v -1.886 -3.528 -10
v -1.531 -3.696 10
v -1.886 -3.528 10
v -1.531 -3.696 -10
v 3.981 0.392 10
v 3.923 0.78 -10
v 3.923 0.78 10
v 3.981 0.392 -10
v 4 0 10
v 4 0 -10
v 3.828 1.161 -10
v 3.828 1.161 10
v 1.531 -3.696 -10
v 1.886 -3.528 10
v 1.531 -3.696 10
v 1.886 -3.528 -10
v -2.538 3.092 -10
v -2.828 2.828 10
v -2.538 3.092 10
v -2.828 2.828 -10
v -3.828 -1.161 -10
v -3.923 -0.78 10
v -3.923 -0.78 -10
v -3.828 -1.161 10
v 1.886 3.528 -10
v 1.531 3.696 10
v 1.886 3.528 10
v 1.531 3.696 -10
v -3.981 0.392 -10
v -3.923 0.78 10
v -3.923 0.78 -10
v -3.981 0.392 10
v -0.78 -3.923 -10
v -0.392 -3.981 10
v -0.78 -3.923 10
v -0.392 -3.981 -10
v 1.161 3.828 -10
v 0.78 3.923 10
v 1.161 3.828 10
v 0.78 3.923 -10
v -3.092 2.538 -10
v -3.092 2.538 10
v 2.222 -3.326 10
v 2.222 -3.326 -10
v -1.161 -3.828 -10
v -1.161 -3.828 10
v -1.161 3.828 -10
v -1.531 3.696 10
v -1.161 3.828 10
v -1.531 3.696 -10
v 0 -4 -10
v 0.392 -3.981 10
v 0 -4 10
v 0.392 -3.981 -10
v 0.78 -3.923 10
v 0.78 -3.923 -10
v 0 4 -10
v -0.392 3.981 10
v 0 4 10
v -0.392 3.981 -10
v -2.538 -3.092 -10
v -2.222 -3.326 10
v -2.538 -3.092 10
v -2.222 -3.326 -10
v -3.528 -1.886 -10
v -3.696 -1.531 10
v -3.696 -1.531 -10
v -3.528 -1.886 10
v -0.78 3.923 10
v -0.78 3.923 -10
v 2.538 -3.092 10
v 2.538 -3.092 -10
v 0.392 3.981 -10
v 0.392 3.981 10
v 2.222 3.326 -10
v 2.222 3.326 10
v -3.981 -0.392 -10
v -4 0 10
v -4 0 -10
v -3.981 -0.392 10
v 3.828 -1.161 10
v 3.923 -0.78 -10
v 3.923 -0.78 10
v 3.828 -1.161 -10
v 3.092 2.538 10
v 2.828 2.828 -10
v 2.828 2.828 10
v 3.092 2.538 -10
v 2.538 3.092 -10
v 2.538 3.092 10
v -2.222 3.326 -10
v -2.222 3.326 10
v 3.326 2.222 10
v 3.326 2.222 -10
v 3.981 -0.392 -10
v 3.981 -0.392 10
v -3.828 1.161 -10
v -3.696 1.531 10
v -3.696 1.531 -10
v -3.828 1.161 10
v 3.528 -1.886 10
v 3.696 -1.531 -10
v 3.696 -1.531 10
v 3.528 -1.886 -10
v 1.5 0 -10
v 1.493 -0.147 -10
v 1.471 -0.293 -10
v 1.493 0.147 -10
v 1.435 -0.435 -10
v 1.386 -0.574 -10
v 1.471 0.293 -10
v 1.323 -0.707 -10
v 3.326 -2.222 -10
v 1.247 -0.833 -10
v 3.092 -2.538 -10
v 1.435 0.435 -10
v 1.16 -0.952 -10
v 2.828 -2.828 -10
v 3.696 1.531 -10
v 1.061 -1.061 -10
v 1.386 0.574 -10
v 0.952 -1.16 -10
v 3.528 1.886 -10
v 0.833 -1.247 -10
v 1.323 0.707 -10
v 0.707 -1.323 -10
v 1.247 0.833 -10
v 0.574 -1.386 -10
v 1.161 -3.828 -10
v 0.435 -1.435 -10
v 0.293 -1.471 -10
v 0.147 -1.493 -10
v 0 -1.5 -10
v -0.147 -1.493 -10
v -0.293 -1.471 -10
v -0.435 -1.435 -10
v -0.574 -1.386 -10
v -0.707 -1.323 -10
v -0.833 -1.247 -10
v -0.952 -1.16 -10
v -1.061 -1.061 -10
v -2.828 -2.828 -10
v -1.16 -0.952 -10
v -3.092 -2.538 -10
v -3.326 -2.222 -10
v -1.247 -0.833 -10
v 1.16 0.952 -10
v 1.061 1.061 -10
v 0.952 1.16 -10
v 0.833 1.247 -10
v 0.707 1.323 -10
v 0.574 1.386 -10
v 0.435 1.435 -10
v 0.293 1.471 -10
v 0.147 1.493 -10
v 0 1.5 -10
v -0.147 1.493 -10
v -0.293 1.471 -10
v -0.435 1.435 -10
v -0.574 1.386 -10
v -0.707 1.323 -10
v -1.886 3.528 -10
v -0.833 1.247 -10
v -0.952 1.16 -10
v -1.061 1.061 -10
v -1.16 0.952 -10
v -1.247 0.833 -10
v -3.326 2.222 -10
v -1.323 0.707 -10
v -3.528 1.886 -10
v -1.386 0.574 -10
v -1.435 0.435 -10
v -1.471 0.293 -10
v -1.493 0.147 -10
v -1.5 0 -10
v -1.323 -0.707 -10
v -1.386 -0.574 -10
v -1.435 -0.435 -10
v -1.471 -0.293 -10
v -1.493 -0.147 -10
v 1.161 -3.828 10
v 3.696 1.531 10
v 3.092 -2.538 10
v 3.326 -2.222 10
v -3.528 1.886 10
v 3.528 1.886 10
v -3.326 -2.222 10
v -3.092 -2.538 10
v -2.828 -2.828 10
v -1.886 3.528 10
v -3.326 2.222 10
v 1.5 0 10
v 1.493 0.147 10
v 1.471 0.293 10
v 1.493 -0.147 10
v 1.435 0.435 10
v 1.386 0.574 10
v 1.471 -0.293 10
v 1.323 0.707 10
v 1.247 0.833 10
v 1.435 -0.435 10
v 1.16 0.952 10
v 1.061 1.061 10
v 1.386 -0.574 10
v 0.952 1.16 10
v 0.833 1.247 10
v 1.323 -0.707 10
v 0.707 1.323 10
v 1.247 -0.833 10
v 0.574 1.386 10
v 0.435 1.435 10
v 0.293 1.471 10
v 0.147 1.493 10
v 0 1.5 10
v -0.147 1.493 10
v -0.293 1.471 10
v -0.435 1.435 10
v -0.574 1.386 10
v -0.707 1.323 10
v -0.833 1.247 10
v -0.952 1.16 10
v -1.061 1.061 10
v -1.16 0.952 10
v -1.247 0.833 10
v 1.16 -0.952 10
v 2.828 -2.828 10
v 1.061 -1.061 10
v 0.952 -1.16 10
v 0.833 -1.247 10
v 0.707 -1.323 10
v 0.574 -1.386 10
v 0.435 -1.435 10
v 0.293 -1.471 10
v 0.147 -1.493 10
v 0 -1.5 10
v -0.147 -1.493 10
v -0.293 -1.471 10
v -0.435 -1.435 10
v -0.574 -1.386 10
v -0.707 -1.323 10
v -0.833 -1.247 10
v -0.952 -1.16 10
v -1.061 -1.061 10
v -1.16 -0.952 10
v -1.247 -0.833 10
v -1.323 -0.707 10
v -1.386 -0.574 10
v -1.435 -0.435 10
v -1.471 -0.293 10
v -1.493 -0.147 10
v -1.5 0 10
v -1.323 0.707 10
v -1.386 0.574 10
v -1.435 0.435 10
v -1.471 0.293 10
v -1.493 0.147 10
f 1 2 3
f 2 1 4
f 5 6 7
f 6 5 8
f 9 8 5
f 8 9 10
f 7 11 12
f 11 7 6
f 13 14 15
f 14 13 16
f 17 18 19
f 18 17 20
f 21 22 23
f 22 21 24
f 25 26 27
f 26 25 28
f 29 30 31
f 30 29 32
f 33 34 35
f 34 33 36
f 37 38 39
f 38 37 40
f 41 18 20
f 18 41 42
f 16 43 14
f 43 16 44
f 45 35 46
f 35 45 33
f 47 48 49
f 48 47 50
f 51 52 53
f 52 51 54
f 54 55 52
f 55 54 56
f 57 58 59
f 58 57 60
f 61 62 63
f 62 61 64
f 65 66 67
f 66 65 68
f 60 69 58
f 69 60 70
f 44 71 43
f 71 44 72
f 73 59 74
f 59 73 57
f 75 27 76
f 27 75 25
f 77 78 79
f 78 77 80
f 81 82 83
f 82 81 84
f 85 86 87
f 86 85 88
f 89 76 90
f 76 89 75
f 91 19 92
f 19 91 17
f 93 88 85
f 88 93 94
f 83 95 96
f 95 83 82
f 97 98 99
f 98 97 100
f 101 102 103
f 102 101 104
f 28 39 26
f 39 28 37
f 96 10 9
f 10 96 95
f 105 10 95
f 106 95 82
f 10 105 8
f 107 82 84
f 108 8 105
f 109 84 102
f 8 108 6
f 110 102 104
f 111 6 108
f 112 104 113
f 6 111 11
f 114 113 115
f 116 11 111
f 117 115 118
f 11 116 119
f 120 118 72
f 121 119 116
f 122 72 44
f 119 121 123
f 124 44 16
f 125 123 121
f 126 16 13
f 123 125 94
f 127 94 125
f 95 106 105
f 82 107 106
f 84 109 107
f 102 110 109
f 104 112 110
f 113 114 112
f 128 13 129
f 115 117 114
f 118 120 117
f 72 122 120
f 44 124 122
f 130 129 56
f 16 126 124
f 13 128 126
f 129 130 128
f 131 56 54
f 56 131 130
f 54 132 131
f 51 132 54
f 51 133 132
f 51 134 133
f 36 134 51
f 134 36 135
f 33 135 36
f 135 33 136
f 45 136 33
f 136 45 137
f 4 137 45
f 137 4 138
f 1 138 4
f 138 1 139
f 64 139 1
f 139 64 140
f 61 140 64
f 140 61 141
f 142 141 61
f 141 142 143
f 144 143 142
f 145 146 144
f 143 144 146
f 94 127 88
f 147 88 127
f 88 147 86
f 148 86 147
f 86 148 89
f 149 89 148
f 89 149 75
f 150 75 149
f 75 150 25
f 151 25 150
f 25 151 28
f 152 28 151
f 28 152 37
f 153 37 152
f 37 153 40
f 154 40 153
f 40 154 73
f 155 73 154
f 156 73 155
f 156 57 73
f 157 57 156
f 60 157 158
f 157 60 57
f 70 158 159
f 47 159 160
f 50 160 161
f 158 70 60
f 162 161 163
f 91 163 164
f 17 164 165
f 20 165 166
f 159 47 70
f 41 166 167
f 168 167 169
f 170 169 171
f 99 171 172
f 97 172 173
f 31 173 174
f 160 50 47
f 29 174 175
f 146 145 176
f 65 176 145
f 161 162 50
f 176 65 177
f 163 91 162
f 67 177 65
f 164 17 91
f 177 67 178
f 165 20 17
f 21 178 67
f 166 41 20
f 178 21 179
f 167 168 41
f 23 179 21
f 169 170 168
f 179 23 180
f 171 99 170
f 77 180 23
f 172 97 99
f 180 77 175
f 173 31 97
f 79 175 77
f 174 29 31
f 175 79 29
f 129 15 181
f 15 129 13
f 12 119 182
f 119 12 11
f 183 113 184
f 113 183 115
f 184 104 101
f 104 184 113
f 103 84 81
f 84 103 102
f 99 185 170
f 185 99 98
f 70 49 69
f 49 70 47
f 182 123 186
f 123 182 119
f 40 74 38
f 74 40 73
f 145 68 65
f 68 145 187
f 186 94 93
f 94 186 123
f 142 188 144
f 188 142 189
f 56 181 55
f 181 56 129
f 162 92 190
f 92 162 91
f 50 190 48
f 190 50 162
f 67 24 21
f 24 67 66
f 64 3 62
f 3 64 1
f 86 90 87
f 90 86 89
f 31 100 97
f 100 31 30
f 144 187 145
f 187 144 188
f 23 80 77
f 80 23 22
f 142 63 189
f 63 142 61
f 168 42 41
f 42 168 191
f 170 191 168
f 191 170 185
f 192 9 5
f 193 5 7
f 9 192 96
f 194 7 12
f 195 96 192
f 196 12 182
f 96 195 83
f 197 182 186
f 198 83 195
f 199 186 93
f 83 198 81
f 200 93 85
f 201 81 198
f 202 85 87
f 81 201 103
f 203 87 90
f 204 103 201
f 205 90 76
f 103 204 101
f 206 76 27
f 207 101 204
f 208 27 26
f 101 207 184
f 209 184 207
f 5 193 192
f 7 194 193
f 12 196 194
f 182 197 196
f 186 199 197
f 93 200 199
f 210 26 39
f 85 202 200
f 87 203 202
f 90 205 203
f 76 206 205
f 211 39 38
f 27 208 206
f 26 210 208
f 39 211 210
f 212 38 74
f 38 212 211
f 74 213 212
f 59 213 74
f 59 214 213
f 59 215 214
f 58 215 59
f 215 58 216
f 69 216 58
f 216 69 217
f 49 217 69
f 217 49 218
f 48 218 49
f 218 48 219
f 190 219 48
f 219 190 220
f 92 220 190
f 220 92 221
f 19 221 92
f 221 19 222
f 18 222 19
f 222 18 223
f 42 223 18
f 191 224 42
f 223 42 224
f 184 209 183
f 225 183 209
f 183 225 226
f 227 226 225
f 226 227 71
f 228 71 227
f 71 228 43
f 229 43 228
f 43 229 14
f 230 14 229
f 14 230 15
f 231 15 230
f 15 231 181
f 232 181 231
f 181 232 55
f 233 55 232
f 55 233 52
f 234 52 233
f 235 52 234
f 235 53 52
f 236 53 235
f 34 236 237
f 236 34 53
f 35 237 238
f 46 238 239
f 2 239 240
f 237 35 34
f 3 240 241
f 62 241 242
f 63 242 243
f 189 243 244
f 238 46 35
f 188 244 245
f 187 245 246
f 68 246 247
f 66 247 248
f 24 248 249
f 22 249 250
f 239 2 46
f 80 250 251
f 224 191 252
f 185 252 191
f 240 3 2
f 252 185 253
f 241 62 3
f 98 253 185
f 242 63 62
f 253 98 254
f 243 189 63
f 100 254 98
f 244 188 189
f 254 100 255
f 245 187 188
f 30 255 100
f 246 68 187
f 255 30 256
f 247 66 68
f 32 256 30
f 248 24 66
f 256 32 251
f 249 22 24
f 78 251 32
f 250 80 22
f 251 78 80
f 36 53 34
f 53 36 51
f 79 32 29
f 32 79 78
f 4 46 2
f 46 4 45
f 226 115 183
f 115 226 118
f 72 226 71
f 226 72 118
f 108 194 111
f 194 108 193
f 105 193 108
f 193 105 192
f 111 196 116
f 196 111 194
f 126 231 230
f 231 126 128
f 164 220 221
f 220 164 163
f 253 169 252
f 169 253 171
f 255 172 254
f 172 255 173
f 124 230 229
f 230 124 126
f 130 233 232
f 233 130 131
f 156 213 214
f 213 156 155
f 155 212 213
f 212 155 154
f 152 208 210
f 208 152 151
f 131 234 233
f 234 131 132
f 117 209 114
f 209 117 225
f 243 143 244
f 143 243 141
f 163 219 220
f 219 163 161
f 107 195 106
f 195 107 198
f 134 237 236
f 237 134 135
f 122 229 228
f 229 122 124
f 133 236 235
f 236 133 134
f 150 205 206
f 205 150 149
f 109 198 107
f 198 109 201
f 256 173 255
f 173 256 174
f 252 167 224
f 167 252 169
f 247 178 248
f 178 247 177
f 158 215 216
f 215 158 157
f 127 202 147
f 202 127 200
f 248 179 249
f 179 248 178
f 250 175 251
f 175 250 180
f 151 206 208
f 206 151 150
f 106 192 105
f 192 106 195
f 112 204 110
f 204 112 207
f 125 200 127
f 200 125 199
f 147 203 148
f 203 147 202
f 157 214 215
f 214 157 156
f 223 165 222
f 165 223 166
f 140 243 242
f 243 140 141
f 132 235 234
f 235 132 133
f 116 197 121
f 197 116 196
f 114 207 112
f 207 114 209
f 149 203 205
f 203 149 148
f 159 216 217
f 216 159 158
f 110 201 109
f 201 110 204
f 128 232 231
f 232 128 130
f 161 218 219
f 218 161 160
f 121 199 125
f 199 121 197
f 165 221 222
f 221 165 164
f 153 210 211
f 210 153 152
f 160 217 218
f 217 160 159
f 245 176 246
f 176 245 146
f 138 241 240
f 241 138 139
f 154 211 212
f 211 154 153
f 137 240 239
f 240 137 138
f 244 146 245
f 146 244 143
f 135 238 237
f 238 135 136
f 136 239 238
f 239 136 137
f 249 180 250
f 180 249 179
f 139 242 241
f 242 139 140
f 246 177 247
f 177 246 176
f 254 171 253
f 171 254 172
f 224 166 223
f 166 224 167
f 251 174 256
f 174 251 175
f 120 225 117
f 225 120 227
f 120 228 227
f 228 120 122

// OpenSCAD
// Parameters
thread_diameter = 3.0; //[1.5:6.0:0.1]
overall_length = 20.0; //[10.0:40.0:0.5]
outer_diameter = 8.0; //[4.0:16.0:0.5]
threaded_length_internal = 20.0; //[5.0:40.0:0.5]
eps = 0.8; //[0.2:2.0:0.1]

// Standoff - complete geometry
module standoff() {
  color("Silver") {
    difference() {
      // Outer cylindrical body
      cylinder(h=overall_length, r=outer_diameter/2, center=true, $fn=64);
      // Internal threaded feature (modeled as a clearance hole)
      cylinder(h=threaded_length_internal + 2*eps, r=thread_diameter/2, center=true, $fn=64);
    }
  }
}

// Pillar - complete geometry (same as standoff for this example)
module pillar() {
  standoff();
}

// Assembly
module assembly() {
  standoff();
  // Additional components can be added here if needed
}

assembly();
